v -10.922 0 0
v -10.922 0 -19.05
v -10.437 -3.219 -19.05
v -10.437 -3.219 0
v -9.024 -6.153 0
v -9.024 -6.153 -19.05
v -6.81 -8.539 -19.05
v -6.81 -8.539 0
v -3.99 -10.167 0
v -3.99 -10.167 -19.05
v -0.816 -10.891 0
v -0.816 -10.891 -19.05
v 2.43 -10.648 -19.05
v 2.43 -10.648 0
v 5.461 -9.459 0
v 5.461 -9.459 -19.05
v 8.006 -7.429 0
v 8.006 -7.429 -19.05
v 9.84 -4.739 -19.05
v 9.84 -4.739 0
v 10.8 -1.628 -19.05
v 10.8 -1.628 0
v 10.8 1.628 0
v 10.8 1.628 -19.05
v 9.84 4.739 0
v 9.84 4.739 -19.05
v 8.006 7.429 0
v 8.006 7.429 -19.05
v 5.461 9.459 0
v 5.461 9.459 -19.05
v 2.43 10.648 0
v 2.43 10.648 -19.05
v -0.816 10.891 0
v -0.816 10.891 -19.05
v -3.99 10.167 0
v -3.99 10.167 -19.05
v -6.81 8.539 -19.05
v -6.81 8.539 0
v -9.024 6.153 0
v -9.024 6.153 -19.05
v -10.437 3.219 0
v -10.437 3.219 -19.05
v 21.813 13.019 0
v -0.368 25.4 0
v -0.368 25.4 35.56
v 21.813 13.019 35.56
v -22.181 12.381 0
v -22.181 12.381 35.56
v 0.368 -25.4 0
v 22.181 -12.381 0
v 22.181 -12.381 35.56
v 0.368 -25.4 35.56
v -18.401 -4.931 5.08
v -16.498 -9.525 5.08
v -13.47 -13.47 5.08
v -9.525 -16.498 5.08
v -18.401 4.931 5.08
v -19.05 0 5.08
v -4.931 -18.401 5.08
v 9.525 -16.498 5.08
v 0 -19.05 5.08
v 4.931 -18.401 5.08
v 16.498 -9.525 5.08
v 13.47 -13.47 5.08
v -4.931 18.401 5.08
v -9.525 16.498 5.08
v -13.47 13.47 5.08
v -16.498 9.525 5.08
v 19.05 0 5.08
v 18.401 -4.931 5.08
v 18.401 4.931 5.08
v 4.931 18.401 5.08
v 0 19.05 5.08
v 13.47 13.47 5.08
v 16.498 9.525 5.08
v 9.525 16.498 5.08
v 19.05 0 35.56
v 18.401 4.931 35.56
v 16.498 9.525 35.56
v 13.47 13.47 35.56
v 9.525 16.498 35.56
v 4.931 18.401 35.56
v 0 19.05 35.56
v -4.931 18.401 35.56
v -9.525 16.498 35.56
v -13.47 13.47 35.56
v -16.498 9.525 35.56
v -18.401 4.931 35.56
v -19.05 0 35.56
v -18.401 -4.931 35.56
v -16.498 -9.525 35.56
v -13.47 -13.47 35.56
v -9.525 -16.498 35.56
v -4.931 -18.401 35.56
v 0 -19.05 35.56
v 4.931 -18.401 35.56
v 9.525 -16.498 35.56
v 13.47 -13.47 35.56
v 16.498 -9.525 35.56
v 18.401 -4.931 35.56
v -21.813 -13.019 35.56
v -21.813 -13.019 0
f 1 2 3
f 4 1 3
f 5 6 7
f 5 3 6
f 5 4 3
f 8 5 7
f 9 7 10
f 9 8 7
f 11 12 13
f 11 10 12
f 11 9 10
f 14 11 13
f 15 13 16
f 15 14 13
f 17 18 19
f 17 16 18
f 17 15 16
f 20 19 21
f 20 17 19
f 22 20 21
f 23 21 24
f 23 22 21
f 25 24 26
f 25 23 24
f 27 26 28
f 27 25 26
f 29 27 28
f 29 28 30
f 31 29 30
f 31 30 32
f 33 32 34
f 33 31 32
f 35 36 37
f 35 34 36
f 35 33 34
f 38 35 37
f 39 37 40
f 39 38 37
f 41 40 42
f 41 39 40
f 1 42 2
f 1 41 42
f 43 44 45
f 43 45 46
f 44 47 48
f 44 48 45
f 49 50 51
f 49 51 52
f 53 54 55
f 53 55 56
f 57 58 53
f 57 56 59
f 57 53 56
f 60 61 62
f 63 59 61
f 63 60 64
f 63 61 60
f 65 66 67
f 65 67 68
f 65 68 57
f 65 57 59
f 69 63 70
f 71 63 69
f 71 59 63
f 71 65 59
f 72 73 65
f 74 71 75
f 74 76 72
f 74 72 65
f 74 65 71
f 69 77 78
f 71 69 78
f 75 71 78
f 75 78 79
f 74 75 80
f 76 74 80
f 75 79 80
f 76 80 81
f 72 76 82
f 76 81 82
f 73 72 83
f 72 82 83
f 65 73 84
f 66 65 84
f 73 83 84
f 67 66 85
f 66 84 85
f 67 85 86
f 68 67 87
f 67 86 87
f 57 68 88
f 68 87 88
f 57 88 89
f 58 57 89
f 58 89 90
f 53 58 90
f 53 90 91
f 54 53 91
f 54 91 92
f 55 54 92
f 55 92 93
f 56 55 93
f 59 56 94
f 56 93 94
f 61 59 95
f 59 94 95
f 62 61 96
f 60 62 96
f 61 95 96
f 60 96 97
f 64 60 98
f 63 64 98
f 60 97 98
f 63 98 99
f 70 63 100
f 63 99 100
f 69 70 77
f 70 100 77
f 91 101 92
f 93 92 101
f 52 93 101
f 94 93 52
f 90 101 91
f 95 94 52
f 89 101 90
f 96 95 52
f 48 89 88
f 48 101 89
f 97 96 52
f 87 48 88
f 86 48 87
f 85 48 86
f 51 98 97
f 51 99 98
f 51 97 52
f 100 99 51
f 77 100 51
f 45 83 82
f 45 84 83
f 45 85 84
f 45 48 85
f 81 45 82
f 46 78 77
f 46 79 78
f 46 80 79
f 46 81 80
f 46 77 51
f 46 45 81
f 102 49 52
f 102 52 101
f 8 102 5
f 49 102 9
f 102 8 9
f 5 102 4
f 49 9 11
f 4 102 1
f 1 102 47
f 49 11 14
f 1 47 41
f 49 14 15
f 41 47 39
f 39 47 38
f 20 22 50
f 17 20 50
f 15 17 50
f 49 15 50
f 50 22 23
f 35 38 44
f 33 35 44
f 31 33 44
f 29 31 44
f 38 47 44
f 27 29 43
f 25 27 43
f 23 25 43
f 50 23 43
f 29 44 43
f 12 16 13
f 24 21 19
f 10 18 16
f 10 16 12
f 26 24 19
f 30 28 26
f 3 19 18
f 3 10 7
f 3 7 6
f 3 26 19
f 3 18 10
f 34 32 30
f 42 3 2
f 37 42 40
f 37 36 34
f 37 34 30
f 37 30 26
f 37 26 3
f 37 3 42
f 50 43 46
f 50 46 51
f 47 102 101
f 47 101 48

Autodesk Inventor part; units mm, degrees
ref_plane "YZ Plane" through (0, 0, 0) normal (1, 0, 0) x (0, 1, 0)
ref_plane "XZ Plane" through (0, 0, 0) normal (0, 1, 0) x (-1, 0, 0)
ref_plane "XY Plane" through (0, 0, 0) normal (0, 0, 1) x (1, 0, 0)
sketch "Sketch1" plane through (0, 0, 0) normal (0, 0, 1) x (1, 0, 0)
  line L0 (21.8129, 13.019) -> (22.1812, -12.381)
  line L1 (22.1812, -12.381) -> (0.3684, -25.4)
  line L2 (0.3684, -25.4) -> (-21.8129, -13.019)
  line L3 (-21.8129, -13.019) -> (-22.1812, 12.381)
  line L4 (-22.1812, 12.381) -> (-0.3684, 25.4)
  line L5 (-0.3684, 25.4) -> (21.8129, 13.019)
  point P0 (0, 0)
  point P1 (0, 0)
  dimension "d0" = 25.4
  dimension "d1" = 120
extrude "Extrusion1" add sketch "Sketch1" along normal blind 35.56
sketch "Sketch2" plane through (0, 0, 35.56) normal (0, 0, 1) x (1, 0, 0)
  circle A0 centre (0, 0) radius 19.05
  dimension "d4" = 38.1
extrude "Extrusion2" cut sketch "Sketch2" against normal blind 30.48
sketch "Sketch3" plane through (0, 0, 0) normal (0, 0, -1) x (-1, 0, 0)
  circle A0 centre (0, 0) radius 10.922
  dimension "d7" = 21.844
extrude "Extrusion3" add sketch "Sketch3" along normal blind 19.05
thread "Thread1" size "7/8-9 UNC" class "2A" standard "ANSI Unified Screw Threads" full length
thread "Thread2" size "1 1/2-6 UNC" class "2B" standard "ANSI Unified Screw Threads" full length
properties part number "adapter"
